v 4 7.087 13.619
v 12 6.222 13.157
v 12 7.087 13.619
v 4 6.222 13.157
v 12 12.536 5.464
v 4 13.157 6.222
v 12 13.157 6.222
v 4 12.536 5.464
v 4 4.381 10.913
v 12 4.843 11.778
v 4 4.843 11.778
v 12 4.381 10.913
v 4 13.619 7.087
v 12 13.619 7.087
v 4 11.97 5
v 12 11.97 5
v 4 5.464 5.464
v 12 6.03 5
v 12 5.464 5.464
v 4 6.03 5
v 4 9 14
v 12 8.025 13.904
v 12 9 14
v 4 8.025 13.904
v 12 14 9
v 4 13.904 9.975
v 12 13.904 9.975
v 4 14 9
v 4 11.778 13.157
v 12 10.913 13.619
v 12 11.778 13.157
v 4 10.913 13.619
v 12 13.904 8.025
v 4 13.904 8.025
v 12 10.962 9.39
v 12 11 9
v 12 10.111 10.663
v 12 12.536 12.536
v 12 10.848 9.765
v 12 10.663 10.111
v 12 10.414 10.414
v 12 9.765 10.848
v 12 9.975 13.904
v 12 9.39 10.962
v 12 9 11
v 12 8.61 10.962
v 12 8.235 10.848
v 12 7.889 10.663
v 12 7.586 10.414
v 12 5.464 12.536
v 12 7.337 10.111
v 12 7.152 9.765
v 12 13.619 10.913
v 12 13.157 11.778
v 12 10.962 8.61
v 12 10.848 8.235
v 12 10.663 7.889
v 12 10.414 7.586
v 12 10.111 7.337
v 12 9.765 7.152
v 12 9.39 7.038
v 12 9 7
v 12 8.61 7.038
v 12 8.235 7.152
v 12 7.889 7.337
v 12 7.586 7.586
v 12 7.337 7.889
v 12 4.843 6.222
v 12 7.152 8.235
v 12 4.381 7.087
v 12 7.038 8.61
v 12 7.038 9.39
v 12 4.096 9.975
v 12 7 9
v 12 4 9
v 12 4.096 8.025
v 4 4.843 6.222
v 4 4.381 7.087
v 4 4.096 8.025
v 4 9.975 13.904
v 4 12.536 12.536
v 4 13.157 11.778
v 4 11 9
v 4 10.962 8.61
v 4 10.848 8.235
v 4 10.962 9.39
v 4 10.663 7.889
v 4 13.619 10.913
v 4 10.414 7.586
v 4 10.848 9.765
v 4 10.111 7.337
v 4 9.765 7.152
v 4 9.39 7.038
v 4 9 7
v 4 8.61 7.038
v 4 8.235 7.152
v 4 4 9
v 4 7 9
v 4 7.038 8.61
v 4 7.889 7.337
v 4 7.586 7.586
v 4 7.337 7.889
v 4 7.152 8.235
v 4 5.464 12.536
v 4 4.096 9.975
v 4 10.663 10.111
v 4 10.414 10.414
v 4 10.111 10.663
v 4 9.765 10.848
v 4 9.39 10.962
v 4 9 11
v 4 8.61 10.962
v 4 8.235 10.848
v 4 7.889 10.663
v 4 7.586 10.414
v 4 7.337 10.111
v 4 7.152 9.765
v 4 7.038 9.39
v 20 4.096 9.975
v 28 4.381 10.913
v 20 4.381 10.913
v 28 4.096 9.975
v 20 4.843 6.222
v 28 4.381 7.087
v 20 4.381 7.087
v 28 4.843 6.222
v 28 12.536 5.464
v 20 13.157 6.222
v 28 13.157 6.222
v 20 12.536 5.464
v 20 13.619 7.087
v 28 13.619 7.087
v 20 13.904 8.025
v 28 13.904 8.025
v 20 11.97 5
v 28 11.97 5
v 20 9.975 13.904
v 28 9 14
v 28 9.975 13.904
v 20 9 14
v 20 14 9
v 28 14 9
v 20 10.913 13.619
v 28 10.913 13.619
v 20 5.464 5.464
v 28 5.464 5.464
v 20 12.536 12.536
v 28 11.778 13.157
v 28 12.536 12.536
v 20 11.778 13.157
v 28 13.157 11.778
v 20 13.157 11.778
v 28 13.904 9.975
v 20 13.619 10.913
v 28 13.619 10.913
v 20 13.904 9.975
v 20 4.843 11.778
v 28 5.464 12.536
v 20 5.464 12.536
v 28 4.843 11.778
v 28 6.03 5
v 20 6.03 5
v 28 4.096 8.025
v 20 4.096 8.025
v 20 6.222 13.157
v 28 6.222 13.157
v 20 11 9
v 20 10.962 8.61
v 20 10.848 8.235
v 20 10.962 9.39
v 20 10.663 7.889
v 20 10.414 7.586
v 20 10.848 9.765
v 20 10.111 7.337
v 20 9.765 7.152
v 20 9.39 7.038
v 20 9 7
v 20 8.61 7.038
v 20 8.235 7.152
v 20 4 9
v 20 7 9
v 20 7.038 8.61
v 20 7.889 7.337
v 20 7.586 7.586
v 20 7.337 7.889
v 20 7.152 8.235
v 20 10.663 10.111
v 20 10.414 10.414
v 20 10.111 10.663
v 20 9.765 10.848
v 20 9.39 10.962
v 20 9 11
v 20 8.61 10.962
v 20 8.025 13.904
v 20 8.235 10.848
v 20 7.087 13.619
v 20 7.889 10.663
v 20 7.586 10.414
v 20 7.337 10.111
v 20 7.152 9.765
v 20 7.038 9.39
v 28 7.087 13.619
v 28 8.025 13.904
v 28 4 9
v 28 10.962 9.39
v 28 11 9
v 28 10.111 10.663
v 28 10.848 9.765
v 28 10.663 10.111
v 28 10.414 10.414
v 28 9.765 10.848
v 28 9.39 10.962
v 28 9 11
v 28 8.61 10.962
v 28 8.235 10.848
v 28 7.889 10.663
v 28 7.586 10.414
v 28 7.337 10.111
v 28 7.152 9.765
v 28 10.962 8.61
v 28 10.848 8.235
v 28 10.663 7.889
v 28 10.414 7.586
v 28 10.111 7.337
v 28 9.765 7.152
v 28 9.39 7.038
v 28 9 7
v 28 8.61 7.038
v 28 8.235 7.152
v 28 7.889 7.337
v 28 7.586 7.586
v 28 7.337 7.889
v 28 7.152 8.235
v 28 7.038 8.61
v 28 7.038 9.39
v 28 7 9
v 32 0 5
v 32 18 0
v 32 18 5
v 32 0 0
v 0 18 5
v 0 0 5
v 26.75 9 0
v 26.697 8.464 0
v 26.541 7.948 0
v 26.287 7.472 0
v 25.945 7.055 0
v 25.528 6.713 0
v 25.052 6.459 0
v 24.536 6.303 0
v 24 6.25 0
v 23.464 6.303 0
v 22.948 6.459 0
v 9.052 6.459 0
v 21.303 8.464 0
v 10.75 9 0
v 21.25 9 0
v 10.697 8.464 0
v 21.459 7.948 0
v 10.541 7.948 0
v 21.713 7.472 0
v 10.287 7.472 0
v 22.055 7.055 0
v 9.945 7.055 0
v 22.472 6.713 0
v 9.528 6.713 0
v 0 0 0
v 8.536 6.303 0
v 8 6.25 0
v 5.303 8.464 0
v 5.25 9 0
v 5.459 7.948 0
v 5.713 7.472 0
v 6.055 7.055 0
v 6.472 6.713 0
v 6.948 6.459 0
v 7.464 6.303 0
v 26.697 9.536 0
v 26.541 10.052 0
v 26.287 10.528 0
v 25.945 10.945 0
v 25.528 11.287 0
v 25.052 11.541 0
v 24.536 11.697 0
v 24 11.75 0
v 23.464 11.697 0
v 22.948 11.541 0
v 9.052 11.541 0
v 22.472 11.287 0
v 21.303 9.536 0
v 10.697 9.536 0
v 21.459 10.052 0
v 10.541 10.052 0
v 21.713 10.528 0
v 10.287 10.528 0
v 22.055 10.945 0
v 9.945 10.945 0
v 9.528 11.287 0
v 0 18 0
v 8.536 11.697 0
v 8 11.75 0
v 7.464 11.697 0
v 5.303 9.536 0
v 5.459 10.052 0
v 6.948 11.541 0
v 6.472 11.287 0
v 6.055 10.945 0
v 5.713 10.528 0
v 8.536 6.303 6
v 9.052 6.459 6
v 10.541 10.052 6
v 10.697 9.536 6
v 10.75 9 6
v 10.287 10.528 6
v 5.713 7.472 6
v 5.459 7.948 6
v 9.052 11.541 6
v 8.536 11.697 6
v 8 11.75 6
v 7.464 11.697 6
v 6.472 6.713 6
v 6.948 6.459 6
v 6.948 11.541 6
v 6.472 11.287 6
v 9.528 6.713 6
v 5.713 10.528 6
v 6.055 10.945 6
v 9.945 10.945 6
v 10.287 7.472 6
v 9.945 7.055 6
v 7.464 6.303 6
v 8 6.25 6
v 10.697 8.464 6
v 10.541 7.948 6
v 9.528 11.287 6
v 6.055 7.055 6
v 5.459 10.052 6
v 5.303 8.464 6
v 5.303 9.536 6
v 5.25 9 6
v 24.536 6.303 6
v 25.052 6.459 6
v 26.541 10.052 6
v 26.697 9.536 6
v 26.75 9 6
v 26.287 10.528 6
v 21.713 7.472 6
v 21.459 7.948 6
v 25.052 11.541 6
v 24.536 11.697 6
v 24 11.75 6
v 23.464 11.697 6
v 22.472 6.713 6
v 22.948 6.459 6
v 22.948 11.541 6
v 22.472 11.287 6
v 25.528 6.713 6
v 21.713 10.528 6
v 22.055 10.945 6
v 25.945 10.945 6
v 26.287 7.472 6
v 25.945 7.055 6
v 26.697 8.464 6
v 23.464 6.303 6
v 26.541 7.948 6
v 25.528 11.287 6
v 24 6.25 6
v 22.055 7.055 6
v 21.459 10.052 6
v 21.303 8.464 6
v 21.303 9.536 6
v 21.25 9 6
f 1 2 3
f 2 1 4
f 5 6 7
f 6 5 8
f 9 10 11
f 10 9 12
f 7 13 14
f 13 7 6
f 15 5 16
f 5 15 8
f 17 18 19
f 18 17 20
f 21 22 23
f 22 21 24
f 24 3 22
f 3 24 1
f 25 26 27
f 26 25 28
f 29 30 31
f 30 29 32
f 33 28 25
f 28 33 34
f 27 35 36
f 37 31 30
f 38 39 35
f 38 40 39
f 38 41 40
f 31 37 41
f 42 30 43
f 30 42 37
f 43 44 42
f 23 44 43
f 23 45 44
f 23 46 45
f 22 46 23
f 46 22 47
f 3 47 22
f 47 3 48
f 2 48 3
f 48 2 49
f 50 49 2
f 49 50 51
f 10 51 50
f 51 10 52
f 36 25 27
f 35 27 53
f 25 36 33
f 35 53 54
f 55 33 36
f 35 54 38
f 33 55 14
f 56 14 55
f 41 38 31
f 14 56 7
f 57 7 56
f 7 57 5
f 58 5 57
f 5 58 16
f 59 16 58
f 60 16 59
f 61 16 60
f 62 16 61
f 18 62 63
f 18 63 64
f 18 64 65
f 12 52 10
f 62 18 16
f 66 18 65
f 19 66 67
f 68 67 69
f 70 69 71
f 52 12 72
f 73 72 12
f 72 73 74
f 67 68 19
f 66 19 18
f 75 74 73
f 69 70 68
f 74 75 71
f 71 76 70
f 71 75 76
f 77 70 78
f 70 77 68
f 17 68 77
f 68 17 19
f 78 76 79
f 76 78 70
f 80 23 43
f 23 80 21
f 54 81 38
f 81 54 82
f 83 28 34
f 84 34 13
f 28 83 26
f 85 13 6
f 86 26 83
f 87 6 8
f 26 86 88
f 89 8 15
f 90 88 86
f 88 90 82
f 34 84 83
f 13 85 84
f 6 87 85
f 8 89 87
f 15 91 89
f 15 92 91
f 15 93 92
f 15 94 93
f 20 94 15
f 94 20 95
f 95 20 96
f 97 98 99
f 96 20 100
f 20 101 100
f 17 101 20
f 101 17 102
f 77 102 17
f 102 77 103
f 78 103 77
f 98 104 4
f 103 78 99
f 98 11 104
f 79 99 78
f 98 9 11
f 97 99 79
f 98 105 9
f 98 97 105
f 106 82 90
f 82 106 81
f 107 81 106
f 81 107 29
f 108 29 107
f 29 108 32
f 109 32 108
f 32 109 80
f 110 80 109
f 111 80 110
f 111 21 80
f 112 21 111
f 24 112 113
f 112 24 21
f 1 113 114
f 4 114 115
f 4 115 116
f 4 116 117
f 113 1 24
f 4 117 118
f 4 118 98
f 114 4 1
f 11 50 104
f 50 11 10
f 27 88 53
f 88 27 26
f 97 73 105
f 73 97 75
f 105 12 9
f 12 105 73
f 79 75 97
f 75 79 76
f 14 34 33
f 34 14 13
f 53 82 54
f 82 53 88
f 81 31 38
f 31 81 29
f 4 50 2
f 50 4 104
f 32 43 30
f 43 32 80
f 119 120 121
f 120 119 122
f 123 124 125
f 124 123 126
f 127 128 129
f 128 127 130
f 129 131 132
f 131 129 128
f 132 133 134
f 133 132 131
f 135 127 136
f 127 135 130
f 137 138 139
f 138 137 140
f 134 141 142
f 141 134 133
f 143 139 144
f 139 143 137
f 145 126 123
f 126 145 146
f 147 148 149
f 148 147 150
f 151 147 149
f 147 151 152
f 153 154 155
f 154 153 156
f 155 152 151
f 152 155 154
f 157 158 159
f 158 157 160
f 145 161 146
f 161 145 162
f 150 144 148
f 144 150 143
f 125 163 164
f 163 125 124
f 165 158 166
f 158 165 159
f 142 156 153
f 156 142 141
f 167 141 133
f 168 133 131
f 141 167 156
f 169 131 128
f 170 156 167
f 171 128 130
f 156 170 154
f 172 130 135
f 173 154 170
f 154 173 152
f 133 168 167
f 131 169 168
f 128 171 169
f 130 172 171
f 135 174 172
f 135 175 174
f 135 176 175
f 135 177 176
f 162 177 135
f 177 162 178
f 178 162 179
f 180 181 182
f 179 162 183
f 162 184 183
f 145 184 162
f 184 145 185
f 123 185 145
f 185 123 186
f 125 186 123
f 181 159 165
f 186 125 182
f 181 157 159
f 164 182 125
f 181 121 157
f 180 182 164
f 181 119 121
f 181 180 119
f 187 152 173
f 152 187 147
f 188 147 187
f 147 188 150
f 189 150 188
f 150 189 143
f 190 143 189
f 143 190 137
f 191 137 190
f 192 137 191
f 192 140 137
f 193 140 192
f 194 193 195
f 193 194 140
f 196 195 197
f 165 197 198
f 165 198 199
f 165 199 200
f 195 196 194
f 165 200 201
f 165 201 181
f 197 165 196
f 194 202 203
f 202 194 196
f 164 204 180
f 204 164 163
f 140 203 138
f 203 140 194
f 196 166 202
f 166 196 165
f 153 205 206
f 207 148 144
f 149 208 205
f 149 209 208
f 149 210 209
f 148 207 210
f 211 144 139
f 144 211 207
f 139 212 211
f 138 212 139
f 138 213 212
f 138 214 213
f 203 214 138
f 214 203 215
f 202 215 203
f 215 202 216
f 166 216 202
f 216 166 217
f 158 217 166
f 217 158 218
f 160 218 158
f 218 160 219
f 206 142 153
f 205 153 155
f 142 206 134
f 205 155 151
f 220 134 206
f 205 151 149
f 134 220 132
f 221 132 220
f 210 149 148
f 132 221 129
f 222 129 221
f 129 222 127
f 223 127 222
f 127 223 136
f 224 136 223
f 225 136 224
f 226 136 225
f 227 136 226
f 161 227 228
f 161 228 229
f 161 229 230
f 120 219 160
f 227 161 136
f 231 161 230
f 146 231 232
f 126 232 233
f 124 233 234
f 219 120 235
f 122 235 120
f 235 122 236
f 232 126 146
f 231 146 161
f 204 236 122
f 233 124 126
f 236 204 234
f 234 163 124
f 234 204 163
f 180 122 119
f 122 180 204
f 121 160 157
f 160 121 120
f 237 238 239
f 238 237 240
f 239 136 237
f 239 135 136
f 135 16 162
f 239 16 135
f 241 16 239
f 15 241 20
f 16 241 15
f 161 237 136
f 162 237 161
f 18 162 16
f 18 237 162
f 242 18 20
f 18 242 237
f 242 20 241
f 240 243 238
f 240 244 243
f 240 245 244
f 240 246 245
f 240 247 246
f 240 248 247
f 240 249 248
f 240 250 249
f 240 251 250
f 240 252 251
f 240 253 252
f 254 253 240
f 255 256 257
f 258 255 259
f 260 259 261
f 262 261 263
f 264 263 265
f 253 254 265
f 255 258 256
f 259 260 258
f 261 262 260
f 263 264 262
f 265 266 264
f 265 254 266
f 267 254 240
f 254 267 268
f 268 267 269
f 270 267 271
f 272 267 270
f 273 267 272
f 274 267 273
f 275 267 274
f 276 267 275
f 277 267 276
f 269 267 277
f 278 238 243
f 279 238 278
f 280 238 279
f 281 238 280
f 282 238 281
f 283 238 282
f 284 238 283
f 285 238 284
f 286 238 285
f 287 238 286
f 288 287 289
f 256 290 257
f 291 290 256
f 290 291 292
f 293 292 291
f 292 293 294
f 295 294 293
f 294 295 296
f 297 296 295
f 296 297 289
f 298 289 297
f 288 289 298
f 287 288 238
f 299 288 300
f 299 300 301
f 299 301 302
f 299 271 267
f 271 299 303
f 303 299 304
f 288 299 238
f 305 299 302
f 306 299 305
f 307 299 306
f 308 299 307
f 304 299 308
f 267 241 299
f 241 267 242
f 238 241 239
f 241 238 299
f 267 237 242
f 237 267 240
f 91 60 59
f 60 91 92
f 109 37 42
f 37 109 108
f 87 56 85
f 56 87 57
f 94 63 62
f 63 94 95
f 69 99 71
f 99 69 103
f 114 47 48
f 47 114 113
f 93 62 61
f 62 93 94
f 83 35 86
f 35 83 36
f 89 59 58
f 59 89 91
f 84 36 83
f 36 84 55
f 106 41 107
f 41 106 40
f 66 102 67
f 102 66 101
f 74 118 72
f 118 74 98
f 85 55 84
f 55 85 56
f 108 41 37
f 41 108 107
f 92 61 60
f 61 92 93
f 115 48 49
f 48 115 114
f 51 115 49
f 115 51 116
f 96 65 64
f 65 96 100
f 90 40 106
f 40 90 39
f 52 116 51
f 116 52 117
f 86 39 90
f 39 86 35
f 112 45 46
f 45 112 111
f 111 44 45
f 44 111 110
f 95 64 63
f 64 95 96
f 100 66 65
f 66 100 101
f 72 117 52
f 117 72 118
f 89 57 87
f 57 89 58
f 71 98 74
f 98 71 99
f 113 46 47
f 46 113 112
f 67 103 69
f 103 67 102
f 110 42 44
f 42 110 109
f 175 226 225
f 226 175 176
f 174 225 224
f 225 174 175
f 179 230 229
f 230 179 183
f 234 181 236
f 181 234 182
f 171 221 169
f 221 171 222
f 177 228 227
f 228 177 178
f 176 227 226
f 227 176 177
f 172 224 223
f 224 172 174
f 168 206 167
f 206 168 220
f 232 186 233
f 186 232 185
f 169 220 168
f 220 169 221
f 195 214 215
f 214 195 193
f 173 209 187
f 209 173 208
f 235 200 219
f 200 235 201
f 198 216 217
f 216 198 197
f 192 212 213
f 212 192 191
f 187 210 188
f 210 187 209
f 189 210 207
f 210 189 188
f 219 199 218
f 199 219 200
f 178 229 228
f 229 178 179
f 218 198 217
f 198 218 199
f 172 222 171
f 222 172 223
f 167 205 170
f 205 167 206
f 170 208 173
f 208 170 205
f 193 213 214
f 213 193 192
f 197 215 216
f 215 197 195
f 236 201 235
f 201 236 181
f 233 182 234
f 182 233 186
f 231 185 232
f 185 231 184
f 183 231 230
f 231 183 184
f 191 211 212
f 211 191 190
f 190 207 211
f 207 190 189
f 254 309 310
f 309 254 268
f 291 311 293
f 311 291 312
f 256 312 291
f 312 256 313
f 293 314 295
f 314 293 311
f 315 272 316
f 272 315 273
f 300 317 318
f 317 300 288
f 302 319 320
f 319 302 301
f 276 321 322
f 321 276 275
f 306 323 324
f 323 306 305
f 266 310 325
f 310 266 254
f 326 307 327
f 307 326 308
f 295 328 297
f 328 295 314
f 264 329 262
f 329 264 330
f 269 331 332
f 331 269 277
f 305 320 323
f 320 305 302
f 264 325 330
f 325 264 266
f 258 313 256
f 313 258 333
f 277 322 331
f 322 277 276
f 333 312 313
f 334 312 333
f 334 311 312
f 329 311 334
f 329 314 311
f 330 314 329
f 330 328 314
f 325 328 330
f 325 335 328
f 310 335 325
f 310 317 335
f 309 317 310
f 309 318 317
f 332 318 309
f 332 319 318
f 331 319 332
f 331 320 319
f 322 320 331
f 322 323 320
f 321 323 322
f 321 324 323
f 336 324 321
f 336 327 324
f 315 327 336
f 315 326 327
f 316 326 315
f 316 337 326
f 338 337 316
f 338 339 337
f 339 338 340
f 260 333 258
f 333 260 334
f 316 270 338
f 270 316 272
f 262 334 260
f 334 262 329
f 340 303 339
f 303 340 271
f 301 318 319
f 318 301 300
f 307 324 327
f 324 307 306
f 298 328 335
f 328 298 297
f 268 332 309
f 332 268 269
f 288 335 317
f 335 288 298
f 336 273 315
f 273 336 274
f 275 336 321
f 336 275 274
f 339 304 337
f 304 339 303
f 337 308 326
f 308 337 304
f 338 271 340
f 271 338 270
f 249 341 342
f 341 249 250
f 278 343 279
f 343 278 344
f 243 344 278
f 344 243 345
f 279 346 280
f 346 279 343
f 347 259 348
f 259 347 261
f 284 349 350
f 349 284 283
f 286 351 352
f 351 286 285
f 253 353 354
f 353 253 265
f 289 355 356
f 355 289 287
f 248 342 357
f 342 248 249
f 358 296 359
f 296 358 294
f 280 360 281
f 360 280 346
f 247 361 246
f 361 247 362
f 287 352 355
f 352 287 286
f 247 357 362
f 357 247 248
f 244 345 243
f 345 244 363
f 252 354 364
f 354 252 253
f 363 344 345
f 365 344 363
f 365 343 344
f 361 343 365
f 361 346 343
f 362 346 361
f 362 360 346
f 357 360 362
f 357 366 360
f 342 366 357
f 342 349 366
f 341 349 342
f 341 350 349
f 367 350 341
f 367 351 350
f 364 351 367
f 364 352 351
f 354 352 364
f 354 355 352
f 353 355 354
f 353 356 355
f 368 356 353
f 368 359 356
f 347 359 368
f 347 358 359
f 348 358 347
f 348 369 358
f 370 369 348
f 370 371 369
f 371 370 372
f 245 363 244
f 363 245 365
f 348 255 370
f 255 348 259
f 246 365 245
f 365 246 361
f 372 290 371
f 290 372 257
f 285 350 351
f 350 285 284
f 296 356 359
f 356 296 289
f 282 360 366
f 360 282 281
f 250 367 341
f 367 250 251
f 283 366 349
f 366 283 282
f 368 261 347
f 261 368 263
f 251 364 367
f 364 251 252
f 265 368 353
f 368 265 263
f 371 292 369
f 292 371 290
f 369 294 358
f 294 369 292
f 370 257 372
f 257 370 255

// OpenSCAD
$fn = 32;

// ----------------------------------------------------------------------
// Cable clip: cable 4 mm, clamp 10 mm, base 32 mm
// ----------------------------------------------------------------------

// --- parameters (mm) ---
plate_x = 32;             // base length, X
plate_y = 18;             // base width, Y
plate_t = 5;              // base thickness
wire_seat_d = 10;         // clamp outside diameter
clip_t = 3;               // clamp wall
cable_d = 4;              // cable opening
ring_w = 8;               // clamp width along the cable
screw_d = 5.5;            // screw clearance
sink = 1;                 // overlap of the clamp into the base
pitch = 16;               // distance between the two clamps

module base() {
  cube([plate_x, plate_y, plate_t]);
}

module clamps() {
  for (sx = [-1, 1])
    translate([plate_x / 2 + sx * pitch / 2, plate_y / 2, plate_t + wire_seat_d / 2 - sink]) rotate([0, 90, 0])
      cylinder(h = ring_w, d = wire_seat_d, center = true);
}

difference() {
  union() {
    base();
    clamps();
  }
  for (sx = [-1, 1])
    translate([plate_x / 2 + sx * pitch / 2, plate_y / 2, plate_t + wire_seat_d / 2 - sink]) rotate([0, 90, 0]) translate([0, 0, -ring_w / 2 - 1]) cylinder(h = ring_w + 2, d = cable_d);
  translate([8, plate_y / 2, -1]) cylinder(h = plate_t + 2, d = screw_d);
  translate([24, plate_y / 2, -1]) cylinder(h = plate_t + 2, d = screw_d);
}
